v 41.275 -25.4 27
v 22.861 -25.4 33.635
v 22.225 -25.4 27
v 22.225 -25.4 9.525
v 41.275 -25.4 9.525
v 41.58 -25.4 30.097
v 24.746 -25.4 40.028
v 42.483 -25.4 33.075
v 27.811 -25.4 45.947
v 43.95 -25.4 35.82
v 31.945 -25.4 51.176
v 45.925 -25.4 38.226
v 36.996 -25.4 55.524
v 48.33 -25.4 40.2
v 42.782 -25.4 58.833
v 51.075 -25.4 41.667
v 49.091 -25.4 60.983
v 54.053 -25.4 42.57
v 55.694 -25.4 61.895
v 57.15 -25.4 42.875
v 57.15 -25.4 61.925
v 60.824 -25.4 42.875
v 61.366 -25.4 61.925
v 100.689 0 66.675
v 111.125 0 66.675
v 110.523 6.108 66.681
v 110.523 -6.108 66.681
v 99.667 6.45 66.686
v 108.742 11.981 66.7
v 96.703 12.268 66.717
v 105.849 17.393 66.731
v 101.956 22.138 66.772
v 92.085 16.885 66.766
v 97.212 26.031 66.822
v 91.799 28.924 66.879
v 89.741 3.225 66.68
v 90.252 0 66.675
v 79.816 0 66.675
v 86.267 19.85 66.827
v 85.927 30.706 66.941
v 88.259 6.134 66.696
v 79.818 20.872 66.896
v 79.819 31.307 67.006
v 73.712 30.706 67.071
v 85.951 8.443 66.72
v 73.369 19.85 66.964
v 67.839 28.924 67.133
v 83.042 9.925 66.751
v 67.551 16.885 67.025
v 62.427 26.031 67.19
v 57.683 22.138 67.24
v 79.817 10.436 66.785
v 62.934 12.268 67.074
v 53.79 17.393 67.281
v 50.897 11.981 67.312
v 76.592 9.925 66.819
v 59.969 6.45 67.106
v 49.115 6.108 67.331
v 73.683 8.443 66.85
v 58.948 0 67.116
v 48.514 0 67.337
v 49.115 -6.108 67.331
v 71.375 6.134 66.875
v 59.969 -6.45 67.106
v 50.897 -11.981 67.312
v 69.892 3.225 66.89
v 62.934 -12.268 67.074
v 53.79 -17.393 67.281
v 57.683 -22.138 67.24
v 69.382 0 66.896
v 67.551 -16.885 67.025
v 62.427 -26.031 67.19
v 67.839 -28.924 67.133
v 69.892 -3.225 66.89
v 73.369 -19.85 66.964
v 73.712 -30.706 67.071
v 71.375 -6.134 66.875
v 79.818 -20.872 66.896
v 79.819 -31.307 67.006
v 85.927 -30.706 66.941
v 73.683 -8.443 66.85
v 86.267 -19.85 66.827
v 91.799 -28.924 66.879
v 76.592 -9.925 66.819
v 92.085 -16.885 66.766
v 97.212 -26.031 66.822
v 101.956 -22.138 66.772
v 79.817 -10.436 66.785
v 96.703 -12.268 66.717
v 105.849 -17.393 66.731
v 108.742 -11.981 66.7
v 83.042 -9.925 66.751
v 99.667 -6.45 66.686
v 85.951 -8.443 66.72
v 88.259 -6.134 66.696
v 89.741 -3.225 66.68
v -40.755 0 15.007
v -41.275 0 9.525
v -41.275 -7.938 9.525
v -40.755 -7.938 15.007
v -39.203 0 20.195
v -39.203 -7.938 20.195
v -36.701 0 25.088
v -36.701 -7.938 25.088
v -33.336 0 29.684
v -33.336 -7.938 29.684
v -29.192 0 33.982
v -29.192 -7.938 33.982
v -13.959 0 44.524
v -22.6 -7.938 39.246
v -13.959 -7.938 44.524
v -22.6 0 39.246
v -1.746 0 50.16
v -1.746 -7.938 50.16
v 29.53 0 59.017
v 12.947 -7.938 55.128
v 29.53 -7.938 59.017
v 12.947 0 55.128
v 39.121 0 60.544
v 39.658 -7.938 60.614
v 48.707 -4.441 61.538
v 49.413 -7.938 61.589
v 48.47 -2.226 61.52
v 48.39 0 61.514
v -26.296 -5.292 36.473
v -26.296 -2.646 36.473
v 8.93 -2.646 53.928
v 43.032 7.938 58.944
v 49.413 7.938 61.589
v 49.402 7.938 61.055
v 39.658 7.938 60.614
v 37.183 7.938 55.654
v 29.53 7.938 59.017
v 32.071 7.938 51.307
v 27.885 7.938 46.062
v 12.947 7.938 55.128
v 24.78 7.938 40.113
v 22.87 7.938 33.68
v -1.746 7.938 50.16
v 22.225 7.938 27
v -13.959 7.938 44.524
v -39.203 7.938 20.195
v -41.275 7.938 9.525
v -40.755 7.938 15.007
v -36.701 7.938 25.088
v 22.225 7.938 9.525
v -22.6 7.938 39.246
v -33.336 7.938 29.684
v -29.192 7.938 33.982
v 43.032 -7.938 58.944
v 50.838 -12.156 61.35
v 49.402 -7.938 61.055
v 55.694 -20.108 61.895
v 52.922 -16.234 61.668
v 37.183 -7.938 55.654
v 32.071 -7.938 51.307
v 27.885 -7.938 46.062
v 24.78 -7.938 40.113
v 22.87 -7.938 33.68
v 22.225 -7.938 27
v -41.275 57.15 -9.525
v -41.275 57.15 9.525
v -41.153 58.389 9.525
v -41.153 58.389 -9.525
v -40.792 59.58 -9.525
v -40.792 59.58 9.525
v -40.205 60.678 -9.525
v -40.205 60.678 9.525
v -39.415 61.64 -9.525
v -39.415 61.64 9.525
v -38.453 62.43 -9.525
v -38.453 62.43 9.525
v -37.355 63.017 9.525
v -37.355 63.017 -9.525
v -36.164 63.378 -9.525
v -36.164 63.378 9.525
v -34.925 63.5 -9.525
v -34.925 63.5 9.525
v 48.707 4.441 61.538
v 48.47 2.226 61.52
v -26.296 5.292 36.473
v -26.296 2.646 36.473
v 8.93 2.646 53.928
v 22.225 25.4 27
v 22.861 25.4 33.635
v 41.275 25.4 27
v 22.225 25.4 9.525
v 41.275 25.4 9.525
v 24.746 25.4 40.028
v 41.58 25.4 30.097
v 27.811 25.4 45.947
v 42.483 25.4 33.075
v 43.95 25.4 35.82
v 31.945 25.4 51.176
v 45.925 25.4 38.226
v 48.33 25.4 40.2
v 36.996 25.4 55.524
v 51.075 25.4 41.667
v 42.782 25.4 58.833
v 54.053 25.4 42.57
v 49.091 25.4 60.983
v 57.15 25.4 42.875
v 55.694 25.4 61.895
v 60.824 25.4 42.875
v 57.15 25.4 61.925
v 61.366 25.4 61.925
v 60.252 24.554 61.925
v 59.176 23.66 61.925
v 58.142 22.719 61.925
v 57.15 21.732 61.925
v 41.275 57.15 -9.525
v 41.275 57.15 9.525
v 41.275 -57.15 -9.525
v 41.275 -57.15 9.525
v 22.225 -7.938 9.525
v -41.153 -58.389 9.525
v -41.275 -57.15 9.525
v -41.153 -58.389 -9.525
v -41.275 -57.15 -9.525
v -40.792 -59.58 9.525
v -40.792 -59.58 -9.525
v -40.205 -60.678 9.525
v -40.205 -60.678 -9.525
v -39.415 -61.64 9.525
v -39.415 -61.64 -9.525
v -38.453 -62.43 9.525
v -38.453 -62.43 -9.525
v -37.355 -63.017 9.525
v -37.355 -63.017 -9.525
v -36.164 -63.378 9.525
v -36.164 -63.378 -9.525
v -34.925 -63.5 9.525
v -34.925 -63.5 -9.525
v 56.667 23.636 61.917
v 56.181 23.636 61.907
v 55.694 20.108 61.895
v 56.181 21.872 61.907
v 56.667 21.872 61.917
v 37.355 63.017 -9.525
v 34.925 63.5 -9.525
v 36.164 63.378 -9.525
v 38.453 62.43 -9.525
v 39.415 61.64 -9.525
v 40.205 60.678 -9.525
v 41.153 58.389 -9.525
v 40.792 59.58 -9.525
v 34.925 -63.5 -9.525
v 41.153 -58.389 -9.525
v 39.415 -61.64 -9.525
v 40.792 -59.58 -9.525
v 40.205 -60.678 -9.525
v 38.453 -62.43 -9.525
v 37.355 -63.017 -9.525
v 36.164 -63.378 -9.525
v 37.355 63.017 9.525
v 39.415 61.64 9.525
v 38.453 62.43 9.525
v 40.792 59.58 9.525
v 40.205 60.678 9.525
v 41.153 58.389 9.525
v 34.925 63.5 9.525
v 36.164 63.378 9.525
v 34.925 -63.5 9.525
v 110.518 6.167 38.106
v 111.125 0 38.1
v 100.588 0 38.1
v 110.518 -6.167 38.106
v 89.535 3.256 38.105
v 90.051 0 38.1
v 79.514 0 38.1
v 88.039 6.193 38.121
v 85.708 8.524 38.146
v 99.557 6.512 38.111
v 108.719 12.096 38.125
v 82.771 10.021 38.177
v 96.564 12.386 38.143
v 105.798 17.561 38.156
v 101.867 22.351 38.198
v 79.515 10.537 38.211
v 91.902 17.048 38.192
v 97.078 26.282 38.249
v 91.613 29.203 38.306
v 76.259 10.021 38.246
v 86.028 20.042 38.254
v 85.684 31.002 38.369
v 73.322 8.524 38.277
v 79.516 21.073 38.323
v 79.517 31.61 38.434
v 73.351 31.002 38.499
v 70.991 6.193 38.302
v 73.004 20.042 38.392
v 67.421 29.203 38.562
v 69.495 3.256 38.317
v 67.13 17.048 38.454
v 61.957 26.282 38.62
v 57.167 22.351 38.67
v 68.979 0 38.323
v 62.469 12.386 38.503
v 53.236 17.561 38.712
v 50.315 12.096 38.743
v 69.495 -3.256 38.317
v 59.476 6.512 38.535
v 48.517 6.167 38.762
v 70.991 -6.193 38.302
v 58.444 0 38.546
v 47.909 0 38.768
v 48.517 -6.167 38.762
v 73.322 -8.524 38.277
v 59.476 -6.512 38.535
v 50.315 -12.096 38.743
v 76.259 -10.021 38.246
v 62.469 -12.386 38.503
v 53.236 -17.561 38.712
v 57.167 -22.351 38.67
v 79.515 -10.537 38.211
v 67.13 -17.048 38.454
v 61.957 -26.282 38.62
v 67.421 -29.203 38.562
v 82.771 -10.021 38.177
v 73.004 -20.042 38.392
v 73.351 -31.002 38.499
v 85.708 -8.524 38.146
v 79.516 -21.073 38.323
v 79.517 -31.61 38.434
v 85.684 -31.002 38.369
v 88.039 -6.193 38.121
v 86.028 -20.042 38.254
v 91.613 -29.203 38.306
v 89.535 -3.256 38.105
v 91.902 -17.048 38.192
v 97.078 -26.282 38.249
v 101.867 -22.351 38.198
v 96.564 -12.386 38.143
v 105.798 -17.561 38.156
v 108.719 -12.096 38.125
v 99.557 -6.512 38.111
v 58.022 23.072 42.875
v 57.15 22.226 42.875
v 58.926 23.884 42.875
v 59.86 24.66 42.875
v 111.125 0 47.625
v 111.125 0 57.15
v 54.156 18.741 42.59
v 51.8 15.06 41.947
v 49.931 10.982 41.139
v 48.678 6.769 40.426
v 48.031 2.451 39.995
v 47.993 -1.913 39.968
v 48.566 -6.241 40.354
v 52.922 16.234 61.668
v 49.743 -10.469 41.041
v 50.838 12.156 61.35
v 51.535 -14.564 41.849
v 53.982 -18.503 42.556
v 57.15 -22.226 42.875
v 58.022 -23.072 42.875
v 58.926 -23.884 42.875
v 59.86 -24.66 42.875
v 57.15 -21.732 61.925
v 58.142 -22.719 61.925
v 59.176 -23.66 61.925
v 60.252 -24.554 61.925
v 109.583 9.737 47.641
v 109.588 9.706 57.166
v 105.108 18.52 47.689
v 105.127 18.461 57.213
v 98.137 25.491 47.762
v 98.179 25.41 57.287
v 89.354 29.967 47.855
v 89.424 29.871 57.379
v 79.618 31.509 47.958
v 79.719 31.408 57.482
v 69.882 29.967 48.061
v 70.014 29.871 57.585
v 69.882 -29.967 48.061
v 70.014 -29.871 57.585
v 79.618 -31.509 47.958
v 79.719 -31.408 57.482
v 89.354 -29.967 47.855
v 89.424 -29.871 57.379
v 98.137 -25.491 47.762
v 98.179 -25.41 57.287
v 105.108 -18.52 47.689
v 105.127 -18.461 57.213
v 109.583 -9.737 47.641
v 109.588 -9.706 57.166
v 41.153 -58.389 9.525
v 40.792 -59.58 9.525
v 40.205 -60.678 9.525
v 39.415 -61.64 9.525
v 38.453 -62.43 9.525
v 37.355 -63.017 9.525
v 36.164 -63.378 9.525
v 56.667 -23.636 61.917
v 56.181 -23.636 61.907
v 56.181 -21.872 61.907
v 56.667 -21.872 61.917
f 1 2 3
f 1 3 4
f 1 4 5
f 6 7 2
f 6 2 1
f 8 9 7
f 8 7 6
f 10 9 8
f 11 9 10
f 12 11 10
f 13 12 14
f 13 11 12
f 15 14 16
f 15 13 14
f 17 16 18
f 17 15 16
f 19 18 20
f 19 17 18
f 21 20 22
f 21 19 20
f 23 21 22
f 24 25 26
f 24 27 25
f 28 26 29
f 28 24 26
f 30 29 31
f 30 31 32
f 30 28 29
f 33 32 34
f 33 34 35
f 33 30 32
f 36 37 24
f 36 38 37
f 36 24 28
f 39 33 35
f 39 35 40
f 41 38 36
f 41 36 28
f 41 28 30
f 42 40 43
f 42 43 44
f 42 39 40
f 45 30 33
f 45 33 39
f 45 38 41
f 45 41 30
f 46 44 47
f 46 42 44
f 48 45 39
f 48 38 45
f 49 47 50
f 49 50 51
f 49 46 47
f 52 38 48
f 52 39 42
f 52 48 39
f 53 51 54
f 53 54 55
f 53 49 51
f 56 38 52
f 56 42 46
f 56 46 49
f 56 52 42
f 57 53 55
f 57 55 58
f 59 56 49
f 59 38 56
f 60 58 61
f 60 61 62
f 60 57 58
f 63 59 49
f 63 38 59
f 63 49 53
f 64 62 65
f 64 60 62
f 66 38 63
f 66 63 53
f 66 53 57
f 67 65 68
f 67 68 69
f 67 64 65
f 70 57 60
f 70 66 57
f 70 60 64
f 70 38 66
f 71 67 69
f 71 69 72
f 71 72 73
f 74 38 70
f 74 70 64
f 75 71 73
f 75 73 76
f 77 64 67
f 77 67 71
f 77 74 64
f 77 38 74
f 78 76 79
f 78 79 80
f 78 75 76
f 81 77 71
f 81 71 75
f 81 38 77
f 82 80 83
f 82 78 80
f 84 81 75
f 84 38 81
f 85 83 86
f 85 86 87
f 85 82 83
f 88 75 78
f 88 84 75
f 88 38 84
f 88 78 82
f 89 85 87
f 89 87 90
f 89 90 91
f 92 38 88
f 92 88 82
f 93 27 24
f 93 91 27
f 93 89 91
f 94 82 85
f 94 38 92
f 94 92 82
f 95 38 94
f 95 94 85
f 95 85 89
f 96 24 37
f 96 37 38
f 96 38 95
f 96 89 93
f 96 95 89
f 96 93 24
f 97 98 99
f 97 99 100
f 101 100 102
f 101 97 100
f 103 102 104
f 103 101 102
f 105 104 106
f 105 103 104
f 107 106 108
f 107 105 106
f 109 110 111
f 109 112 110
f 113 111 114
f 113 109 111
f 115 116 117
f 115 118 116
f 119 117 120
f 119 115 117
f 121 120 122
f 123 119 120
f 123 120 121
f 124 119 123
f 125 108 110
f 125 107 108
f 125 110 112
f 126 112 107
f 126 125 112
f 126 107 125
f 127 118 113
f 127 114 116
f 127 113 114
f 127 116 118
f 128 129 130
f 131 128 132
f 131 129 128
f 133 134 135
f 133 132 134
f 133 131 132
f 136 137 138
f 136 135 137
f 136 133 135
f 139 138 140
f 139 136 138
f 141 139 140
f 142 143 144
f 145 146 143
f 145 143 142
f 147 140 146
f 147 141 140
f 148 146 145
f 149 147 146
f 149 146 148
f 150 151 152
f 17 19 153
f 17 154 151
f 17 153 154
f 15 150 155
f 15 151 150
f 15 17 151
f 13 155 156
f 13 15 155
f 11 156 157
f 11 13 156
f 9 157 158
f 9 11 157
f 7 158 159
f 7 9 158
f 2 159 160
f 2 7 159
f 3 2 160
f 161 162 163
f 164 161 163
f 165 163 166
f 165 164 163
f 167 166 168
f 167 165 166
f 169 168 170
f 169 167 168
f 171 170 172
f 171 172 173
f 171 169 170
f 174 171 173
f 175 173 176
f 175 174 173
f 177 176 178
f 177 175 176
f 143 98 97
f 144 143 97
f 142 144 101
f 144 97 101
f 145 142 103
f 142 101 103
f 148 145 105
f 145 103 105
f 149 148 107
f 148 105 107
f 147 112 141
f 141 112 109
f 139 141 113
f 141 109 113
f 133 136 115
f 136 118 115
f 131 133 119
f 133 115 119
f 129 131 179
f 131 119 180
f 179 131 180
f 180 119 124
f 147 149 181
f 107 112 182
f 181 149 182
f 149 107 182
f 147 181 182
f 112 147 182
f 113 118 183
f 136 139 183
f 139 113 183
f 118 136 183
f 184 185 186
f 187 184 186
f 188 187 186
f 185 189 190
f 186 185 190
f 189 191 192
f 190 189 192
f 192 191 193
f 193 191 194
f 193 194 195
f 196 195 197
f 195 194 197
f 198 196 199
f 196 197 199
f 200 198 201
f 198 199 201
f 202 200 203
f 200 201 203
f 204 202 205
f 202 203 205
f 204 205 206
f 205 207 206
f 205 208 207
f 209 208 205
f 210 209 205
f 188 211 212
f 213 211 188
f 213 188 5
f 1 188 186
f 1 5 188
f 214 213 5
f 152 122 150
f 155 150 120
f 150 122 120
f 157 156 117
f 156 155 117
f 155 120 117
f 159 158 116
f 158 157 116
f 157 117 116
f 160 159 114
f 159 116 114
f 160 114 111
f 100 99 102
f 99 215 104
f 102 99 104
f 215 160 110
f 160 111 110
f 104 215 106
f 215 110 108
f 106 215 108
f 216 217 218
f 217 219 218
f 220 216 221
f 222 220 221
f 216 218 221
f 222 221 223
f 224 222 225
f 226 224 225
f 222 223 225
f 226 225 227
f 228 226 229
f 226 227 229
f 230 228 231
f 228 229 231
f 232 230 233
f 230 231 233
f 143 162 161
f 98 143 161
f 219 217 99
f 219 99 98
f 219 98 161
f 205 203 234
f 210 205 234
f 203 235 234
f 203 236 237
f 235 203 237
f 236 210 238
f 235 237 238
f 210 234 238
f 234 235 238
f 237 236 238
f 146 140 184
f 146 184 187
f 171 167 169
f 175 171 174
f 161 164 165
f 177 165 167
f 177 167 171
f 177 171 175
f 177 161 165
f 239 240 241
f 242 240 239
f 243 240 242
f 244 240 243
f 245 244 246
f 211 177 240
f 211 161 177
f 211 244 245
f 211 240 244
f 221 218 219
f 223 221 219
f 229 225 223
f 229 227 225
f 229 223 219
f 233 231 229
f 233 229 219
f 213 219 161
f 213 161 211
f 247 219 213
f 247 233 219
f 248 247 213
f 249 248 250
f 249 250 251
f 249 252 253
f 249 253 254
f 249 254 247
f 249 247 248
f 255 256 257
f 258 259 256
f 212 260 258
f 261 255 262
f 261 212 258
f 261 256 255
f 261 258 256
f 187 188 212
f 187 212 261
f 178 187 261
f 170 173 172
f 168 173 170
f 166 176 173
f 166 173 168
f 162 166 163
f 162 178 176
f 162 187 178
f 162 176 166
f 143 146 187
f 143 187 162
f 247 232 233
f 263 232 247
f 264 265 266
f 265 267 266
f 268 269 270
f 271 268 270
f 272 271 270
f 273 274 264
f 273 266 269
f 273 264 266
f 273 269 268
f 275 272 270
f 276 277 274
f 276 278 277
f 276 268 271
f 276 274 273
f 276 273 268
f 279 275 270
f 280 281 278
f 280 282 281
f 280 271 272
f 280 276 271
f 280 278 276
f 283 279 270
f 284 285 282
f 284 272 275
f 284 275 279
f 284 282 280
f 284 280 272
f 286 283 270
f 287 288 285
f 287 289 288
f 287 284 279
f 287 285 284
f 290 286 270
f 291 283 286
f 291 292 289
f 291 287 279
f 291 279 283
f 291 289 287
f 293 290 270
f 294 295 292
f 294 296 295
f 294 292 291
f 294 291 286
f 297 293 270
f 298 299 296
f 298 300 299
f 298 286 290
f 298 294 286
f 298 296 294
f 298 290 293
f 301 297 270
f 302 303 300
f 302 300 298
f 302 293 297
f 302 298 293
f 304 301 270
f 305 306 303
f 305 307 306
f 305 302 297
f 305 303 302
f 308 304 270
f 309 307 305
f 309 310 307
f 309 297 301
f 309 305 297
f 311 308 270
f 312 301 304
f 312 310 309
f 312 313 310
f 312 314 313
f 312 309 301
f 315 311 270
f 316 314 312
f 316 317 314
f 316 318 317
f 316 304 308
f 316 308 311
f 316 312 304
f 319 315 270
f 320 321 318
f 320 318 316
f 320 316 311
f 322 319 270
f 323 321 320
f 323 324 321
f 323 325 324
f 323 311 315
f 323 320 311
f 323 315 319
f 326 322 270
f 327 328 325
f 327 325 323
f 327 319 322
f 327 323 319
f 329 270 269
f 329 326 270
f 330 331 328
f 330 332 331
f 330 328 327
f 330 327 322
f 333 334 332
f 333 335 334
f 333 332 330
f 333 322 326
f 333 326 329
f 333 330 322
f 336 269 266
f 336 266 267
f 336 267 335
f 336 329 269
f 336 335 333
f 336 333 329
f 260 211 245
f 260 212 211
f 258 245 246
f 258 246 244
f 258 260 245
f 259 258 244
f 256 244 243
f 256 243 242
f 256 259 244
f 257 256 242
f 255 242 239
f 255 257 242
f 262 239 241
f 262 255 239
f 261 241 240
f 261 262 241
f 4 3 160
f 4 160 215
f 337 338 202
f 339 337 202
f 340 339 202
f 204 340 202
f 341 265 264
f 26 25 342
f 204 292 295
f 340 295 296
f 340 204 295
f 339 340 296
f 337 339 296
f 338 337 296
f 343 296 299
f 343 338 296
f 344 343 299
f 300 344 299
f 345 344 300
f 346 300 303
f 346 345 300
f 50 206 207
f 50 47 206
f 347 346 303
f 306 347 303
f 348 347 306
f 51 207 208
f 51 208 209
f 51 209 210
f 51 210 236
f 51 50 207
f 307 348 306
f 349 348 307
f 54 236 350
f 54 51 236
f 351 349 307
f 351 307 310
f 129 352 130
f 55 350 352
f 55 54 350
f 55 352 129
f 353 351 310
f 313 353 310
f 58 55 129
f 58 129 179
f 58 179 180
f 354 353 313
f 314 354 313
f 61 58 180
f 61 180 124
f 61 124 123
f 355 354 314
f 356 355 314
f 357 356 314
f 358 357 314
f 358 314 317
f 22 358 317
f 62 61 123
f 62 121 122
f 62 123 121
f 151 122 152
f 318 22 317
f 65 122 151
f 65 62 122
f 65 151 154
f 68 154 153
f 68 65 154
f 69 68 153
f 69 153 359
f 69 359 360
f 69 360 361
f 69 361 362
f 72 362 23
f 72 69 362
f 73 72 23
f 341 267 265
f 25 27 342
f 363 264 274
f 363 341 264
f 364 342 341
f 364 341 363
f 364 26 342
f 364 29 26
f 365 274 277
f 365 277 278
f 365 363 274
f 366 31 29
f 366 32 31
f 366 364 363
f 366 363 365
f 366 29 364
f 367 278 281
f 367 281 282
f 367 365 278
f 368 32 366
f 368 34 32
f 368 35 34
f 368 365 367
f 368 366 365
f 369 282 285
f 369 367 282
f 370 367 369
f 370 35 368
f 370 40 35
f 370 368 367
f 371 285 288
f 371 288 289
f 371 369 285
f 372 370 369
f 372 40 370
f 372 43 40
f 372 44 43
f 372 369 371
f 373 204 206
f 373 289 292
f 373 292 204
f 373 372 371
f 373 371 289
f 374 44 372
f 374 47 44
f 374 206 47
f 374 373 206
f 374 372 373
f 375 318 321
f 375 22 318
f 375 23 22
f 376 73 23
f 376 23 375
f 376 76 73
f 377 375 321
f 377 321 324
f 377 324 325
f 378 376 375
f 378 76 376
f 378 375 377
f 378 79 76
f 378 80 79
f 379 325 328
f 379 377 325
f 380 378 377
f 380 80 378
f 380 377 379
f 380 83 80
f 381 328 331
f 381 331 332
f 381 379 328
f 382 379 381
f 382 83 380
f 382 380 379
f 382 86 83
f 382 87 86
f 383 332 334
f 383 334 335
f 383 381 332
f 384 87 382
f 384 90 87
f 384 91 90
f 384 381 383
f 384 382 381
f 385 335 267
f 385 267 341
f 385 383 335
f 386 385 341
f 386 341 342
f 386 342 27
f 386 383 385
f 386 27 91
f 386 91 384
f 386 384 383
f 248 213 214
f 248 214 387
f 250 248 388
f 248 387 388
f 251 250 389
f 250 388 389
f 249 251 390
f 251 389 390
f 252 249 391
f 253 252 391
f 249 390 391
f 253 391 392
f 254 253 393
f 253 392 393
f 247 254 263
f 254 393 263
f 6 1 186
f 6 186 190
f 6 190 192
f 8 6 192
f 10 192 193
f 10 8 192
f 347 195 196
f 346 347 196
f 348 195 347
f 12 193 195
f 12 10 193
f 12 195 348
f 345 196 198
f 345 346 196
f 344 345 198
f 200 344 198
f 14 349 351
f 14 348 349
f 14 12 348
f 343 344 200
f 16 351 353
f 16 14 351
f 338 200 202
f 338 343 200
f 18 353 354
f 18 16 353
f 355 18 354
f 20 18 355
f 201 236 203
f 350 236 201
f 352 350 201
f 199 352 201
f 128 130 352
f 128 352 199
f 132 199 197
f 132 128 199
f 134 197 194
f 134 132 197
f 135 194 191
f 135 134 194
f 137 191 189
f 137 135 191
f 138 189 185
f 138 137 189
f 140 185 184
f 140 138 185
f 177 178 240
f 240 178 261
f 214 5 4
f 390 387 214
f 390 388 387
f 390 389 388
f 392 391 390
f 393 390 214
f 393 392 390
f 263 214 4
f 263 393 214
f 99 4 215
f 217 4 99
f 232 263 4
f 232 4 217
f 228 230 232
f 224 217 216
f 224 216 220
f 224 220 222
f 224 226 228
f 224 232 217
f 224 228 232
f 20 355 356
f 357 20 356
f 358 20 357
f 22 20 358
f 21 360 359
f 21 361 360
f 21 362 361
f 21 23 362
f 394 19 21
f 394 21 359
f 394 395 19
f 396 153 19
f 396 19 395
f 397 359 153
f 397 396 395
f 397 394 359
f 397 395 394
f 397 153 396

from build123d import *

# Parameters (mm, degrees)
F1_DEPTH = 63.5
F2_DEPTH = 25.4
F3_DEPTH = 7.9375
F5_R     = 6.35


with BuildPart() as f1:
    # F0 (on Front) → F1 (new body, symmetric)
    with BuildSketch(Plane.XZ):
        Polygon((-41.275, 9.525), (-41.275, -9.525), (41.275, -9.525), (41.275, 9.525), (22.225, 9.525), align=None)
    extrude(amount=F1_DEPTH, both=True)

    # F0 (on Front) → F2 (join, symmetric)
    with BuildSketch(Plane.XZ):
        Polygon((79.7655956935, 61.9252), (60.325, 61.9252), (60.325, 42.8752), (79.5641856105, 42.8752), align=None)
        with BuildLine():
            Line((22.225, 9.525), (41.275, 9.525))
            Line((41.275, 9.525), (41.275, 27.0002))
            ThreePointArc((41.275, 27.0002), (45.9246798487, 38.2255201513), (57.15, 42.8752))
            Line((57.15, 42.8752), (60.325, 42.8752))
            Line((60.325, 42.8752), (60.325, 61.9252))
            Line((60.325, 61.9252), (57.15, 61.9252))
            add(Edge.make_bspline(
                [(55.693596433, 61.8948201247), (56.1824633376, 61.9077141439), (56.6679863057, 61.9178418733), (57.15, 61.9252)],
                knots=[110.0991470384, 110.0991470384, 110.0991470384, 110.0991470384, 111.5045361635, 111.5045361635, 111.5045361635, 111.5045361635], degree=3))
            ThreePointArc((55.693596433, 61.8948201247), (31.944638273, 51.1755048628), (22.225, 27.0002))
            Line((22.225, 27.0002), (22.225, 9.525))
        make_face()
    extrude(amount=F2_DEPTH, both=True)

    # F0 (on Front) → F3 (join, symmetric)
    with BuildSketch(Plane.XZ):
        with BuildLine():
            add(Edge.make_bspline(
                [(-41.275, 9.525), (-41.4253577481, 42.8971199806), (17.395428152, 60.8846938277), (55.693596433, 61.8948201247)],
                knots=[0, 0, 0, 0, 110.0991470384, 110.0991470384, 110.0991470384, 110.0991470384], degree=3))
            Line((-41.275, 9.525), (22.225, 9.525))
            Line((22.225, 9.525), (22.225, 27.0002))
            ThreePointArc((22.225, 27.0002), (31.944638273, 51.1755048628), (55.693596433, 61.8948201247))
        make_face()
    extrude(amount=F3_DEPTH, both=True)

    # F0 (on Front) → F4 (revolve)
    with BuildSketch(Plane.XZ):
        Polygon((79.8158139409, 66.675), (79.7655956935, 61.9252), (79.5641856105, 42.8752), (79.5136988163, 38.1), (111.125, 38.1), (111.125, 66.675), align=None)
    revolve(axis=Axis((79.6647563786, 0, 52.3875), (0.0105721169, 0, 0.9999441136)))

    # F5
    f5_edges = [f1.edges().sort_by_distance(p)[0] for p in [
        (41.275, -63.5, 0),
        (-41.275, -63.5, 0),
        (-41.275, 63.5, 0),
        (41.275, 63.5, 0),
    ]]
    fillet(f5_edges, radius=F5_R)


solid = f1.part
